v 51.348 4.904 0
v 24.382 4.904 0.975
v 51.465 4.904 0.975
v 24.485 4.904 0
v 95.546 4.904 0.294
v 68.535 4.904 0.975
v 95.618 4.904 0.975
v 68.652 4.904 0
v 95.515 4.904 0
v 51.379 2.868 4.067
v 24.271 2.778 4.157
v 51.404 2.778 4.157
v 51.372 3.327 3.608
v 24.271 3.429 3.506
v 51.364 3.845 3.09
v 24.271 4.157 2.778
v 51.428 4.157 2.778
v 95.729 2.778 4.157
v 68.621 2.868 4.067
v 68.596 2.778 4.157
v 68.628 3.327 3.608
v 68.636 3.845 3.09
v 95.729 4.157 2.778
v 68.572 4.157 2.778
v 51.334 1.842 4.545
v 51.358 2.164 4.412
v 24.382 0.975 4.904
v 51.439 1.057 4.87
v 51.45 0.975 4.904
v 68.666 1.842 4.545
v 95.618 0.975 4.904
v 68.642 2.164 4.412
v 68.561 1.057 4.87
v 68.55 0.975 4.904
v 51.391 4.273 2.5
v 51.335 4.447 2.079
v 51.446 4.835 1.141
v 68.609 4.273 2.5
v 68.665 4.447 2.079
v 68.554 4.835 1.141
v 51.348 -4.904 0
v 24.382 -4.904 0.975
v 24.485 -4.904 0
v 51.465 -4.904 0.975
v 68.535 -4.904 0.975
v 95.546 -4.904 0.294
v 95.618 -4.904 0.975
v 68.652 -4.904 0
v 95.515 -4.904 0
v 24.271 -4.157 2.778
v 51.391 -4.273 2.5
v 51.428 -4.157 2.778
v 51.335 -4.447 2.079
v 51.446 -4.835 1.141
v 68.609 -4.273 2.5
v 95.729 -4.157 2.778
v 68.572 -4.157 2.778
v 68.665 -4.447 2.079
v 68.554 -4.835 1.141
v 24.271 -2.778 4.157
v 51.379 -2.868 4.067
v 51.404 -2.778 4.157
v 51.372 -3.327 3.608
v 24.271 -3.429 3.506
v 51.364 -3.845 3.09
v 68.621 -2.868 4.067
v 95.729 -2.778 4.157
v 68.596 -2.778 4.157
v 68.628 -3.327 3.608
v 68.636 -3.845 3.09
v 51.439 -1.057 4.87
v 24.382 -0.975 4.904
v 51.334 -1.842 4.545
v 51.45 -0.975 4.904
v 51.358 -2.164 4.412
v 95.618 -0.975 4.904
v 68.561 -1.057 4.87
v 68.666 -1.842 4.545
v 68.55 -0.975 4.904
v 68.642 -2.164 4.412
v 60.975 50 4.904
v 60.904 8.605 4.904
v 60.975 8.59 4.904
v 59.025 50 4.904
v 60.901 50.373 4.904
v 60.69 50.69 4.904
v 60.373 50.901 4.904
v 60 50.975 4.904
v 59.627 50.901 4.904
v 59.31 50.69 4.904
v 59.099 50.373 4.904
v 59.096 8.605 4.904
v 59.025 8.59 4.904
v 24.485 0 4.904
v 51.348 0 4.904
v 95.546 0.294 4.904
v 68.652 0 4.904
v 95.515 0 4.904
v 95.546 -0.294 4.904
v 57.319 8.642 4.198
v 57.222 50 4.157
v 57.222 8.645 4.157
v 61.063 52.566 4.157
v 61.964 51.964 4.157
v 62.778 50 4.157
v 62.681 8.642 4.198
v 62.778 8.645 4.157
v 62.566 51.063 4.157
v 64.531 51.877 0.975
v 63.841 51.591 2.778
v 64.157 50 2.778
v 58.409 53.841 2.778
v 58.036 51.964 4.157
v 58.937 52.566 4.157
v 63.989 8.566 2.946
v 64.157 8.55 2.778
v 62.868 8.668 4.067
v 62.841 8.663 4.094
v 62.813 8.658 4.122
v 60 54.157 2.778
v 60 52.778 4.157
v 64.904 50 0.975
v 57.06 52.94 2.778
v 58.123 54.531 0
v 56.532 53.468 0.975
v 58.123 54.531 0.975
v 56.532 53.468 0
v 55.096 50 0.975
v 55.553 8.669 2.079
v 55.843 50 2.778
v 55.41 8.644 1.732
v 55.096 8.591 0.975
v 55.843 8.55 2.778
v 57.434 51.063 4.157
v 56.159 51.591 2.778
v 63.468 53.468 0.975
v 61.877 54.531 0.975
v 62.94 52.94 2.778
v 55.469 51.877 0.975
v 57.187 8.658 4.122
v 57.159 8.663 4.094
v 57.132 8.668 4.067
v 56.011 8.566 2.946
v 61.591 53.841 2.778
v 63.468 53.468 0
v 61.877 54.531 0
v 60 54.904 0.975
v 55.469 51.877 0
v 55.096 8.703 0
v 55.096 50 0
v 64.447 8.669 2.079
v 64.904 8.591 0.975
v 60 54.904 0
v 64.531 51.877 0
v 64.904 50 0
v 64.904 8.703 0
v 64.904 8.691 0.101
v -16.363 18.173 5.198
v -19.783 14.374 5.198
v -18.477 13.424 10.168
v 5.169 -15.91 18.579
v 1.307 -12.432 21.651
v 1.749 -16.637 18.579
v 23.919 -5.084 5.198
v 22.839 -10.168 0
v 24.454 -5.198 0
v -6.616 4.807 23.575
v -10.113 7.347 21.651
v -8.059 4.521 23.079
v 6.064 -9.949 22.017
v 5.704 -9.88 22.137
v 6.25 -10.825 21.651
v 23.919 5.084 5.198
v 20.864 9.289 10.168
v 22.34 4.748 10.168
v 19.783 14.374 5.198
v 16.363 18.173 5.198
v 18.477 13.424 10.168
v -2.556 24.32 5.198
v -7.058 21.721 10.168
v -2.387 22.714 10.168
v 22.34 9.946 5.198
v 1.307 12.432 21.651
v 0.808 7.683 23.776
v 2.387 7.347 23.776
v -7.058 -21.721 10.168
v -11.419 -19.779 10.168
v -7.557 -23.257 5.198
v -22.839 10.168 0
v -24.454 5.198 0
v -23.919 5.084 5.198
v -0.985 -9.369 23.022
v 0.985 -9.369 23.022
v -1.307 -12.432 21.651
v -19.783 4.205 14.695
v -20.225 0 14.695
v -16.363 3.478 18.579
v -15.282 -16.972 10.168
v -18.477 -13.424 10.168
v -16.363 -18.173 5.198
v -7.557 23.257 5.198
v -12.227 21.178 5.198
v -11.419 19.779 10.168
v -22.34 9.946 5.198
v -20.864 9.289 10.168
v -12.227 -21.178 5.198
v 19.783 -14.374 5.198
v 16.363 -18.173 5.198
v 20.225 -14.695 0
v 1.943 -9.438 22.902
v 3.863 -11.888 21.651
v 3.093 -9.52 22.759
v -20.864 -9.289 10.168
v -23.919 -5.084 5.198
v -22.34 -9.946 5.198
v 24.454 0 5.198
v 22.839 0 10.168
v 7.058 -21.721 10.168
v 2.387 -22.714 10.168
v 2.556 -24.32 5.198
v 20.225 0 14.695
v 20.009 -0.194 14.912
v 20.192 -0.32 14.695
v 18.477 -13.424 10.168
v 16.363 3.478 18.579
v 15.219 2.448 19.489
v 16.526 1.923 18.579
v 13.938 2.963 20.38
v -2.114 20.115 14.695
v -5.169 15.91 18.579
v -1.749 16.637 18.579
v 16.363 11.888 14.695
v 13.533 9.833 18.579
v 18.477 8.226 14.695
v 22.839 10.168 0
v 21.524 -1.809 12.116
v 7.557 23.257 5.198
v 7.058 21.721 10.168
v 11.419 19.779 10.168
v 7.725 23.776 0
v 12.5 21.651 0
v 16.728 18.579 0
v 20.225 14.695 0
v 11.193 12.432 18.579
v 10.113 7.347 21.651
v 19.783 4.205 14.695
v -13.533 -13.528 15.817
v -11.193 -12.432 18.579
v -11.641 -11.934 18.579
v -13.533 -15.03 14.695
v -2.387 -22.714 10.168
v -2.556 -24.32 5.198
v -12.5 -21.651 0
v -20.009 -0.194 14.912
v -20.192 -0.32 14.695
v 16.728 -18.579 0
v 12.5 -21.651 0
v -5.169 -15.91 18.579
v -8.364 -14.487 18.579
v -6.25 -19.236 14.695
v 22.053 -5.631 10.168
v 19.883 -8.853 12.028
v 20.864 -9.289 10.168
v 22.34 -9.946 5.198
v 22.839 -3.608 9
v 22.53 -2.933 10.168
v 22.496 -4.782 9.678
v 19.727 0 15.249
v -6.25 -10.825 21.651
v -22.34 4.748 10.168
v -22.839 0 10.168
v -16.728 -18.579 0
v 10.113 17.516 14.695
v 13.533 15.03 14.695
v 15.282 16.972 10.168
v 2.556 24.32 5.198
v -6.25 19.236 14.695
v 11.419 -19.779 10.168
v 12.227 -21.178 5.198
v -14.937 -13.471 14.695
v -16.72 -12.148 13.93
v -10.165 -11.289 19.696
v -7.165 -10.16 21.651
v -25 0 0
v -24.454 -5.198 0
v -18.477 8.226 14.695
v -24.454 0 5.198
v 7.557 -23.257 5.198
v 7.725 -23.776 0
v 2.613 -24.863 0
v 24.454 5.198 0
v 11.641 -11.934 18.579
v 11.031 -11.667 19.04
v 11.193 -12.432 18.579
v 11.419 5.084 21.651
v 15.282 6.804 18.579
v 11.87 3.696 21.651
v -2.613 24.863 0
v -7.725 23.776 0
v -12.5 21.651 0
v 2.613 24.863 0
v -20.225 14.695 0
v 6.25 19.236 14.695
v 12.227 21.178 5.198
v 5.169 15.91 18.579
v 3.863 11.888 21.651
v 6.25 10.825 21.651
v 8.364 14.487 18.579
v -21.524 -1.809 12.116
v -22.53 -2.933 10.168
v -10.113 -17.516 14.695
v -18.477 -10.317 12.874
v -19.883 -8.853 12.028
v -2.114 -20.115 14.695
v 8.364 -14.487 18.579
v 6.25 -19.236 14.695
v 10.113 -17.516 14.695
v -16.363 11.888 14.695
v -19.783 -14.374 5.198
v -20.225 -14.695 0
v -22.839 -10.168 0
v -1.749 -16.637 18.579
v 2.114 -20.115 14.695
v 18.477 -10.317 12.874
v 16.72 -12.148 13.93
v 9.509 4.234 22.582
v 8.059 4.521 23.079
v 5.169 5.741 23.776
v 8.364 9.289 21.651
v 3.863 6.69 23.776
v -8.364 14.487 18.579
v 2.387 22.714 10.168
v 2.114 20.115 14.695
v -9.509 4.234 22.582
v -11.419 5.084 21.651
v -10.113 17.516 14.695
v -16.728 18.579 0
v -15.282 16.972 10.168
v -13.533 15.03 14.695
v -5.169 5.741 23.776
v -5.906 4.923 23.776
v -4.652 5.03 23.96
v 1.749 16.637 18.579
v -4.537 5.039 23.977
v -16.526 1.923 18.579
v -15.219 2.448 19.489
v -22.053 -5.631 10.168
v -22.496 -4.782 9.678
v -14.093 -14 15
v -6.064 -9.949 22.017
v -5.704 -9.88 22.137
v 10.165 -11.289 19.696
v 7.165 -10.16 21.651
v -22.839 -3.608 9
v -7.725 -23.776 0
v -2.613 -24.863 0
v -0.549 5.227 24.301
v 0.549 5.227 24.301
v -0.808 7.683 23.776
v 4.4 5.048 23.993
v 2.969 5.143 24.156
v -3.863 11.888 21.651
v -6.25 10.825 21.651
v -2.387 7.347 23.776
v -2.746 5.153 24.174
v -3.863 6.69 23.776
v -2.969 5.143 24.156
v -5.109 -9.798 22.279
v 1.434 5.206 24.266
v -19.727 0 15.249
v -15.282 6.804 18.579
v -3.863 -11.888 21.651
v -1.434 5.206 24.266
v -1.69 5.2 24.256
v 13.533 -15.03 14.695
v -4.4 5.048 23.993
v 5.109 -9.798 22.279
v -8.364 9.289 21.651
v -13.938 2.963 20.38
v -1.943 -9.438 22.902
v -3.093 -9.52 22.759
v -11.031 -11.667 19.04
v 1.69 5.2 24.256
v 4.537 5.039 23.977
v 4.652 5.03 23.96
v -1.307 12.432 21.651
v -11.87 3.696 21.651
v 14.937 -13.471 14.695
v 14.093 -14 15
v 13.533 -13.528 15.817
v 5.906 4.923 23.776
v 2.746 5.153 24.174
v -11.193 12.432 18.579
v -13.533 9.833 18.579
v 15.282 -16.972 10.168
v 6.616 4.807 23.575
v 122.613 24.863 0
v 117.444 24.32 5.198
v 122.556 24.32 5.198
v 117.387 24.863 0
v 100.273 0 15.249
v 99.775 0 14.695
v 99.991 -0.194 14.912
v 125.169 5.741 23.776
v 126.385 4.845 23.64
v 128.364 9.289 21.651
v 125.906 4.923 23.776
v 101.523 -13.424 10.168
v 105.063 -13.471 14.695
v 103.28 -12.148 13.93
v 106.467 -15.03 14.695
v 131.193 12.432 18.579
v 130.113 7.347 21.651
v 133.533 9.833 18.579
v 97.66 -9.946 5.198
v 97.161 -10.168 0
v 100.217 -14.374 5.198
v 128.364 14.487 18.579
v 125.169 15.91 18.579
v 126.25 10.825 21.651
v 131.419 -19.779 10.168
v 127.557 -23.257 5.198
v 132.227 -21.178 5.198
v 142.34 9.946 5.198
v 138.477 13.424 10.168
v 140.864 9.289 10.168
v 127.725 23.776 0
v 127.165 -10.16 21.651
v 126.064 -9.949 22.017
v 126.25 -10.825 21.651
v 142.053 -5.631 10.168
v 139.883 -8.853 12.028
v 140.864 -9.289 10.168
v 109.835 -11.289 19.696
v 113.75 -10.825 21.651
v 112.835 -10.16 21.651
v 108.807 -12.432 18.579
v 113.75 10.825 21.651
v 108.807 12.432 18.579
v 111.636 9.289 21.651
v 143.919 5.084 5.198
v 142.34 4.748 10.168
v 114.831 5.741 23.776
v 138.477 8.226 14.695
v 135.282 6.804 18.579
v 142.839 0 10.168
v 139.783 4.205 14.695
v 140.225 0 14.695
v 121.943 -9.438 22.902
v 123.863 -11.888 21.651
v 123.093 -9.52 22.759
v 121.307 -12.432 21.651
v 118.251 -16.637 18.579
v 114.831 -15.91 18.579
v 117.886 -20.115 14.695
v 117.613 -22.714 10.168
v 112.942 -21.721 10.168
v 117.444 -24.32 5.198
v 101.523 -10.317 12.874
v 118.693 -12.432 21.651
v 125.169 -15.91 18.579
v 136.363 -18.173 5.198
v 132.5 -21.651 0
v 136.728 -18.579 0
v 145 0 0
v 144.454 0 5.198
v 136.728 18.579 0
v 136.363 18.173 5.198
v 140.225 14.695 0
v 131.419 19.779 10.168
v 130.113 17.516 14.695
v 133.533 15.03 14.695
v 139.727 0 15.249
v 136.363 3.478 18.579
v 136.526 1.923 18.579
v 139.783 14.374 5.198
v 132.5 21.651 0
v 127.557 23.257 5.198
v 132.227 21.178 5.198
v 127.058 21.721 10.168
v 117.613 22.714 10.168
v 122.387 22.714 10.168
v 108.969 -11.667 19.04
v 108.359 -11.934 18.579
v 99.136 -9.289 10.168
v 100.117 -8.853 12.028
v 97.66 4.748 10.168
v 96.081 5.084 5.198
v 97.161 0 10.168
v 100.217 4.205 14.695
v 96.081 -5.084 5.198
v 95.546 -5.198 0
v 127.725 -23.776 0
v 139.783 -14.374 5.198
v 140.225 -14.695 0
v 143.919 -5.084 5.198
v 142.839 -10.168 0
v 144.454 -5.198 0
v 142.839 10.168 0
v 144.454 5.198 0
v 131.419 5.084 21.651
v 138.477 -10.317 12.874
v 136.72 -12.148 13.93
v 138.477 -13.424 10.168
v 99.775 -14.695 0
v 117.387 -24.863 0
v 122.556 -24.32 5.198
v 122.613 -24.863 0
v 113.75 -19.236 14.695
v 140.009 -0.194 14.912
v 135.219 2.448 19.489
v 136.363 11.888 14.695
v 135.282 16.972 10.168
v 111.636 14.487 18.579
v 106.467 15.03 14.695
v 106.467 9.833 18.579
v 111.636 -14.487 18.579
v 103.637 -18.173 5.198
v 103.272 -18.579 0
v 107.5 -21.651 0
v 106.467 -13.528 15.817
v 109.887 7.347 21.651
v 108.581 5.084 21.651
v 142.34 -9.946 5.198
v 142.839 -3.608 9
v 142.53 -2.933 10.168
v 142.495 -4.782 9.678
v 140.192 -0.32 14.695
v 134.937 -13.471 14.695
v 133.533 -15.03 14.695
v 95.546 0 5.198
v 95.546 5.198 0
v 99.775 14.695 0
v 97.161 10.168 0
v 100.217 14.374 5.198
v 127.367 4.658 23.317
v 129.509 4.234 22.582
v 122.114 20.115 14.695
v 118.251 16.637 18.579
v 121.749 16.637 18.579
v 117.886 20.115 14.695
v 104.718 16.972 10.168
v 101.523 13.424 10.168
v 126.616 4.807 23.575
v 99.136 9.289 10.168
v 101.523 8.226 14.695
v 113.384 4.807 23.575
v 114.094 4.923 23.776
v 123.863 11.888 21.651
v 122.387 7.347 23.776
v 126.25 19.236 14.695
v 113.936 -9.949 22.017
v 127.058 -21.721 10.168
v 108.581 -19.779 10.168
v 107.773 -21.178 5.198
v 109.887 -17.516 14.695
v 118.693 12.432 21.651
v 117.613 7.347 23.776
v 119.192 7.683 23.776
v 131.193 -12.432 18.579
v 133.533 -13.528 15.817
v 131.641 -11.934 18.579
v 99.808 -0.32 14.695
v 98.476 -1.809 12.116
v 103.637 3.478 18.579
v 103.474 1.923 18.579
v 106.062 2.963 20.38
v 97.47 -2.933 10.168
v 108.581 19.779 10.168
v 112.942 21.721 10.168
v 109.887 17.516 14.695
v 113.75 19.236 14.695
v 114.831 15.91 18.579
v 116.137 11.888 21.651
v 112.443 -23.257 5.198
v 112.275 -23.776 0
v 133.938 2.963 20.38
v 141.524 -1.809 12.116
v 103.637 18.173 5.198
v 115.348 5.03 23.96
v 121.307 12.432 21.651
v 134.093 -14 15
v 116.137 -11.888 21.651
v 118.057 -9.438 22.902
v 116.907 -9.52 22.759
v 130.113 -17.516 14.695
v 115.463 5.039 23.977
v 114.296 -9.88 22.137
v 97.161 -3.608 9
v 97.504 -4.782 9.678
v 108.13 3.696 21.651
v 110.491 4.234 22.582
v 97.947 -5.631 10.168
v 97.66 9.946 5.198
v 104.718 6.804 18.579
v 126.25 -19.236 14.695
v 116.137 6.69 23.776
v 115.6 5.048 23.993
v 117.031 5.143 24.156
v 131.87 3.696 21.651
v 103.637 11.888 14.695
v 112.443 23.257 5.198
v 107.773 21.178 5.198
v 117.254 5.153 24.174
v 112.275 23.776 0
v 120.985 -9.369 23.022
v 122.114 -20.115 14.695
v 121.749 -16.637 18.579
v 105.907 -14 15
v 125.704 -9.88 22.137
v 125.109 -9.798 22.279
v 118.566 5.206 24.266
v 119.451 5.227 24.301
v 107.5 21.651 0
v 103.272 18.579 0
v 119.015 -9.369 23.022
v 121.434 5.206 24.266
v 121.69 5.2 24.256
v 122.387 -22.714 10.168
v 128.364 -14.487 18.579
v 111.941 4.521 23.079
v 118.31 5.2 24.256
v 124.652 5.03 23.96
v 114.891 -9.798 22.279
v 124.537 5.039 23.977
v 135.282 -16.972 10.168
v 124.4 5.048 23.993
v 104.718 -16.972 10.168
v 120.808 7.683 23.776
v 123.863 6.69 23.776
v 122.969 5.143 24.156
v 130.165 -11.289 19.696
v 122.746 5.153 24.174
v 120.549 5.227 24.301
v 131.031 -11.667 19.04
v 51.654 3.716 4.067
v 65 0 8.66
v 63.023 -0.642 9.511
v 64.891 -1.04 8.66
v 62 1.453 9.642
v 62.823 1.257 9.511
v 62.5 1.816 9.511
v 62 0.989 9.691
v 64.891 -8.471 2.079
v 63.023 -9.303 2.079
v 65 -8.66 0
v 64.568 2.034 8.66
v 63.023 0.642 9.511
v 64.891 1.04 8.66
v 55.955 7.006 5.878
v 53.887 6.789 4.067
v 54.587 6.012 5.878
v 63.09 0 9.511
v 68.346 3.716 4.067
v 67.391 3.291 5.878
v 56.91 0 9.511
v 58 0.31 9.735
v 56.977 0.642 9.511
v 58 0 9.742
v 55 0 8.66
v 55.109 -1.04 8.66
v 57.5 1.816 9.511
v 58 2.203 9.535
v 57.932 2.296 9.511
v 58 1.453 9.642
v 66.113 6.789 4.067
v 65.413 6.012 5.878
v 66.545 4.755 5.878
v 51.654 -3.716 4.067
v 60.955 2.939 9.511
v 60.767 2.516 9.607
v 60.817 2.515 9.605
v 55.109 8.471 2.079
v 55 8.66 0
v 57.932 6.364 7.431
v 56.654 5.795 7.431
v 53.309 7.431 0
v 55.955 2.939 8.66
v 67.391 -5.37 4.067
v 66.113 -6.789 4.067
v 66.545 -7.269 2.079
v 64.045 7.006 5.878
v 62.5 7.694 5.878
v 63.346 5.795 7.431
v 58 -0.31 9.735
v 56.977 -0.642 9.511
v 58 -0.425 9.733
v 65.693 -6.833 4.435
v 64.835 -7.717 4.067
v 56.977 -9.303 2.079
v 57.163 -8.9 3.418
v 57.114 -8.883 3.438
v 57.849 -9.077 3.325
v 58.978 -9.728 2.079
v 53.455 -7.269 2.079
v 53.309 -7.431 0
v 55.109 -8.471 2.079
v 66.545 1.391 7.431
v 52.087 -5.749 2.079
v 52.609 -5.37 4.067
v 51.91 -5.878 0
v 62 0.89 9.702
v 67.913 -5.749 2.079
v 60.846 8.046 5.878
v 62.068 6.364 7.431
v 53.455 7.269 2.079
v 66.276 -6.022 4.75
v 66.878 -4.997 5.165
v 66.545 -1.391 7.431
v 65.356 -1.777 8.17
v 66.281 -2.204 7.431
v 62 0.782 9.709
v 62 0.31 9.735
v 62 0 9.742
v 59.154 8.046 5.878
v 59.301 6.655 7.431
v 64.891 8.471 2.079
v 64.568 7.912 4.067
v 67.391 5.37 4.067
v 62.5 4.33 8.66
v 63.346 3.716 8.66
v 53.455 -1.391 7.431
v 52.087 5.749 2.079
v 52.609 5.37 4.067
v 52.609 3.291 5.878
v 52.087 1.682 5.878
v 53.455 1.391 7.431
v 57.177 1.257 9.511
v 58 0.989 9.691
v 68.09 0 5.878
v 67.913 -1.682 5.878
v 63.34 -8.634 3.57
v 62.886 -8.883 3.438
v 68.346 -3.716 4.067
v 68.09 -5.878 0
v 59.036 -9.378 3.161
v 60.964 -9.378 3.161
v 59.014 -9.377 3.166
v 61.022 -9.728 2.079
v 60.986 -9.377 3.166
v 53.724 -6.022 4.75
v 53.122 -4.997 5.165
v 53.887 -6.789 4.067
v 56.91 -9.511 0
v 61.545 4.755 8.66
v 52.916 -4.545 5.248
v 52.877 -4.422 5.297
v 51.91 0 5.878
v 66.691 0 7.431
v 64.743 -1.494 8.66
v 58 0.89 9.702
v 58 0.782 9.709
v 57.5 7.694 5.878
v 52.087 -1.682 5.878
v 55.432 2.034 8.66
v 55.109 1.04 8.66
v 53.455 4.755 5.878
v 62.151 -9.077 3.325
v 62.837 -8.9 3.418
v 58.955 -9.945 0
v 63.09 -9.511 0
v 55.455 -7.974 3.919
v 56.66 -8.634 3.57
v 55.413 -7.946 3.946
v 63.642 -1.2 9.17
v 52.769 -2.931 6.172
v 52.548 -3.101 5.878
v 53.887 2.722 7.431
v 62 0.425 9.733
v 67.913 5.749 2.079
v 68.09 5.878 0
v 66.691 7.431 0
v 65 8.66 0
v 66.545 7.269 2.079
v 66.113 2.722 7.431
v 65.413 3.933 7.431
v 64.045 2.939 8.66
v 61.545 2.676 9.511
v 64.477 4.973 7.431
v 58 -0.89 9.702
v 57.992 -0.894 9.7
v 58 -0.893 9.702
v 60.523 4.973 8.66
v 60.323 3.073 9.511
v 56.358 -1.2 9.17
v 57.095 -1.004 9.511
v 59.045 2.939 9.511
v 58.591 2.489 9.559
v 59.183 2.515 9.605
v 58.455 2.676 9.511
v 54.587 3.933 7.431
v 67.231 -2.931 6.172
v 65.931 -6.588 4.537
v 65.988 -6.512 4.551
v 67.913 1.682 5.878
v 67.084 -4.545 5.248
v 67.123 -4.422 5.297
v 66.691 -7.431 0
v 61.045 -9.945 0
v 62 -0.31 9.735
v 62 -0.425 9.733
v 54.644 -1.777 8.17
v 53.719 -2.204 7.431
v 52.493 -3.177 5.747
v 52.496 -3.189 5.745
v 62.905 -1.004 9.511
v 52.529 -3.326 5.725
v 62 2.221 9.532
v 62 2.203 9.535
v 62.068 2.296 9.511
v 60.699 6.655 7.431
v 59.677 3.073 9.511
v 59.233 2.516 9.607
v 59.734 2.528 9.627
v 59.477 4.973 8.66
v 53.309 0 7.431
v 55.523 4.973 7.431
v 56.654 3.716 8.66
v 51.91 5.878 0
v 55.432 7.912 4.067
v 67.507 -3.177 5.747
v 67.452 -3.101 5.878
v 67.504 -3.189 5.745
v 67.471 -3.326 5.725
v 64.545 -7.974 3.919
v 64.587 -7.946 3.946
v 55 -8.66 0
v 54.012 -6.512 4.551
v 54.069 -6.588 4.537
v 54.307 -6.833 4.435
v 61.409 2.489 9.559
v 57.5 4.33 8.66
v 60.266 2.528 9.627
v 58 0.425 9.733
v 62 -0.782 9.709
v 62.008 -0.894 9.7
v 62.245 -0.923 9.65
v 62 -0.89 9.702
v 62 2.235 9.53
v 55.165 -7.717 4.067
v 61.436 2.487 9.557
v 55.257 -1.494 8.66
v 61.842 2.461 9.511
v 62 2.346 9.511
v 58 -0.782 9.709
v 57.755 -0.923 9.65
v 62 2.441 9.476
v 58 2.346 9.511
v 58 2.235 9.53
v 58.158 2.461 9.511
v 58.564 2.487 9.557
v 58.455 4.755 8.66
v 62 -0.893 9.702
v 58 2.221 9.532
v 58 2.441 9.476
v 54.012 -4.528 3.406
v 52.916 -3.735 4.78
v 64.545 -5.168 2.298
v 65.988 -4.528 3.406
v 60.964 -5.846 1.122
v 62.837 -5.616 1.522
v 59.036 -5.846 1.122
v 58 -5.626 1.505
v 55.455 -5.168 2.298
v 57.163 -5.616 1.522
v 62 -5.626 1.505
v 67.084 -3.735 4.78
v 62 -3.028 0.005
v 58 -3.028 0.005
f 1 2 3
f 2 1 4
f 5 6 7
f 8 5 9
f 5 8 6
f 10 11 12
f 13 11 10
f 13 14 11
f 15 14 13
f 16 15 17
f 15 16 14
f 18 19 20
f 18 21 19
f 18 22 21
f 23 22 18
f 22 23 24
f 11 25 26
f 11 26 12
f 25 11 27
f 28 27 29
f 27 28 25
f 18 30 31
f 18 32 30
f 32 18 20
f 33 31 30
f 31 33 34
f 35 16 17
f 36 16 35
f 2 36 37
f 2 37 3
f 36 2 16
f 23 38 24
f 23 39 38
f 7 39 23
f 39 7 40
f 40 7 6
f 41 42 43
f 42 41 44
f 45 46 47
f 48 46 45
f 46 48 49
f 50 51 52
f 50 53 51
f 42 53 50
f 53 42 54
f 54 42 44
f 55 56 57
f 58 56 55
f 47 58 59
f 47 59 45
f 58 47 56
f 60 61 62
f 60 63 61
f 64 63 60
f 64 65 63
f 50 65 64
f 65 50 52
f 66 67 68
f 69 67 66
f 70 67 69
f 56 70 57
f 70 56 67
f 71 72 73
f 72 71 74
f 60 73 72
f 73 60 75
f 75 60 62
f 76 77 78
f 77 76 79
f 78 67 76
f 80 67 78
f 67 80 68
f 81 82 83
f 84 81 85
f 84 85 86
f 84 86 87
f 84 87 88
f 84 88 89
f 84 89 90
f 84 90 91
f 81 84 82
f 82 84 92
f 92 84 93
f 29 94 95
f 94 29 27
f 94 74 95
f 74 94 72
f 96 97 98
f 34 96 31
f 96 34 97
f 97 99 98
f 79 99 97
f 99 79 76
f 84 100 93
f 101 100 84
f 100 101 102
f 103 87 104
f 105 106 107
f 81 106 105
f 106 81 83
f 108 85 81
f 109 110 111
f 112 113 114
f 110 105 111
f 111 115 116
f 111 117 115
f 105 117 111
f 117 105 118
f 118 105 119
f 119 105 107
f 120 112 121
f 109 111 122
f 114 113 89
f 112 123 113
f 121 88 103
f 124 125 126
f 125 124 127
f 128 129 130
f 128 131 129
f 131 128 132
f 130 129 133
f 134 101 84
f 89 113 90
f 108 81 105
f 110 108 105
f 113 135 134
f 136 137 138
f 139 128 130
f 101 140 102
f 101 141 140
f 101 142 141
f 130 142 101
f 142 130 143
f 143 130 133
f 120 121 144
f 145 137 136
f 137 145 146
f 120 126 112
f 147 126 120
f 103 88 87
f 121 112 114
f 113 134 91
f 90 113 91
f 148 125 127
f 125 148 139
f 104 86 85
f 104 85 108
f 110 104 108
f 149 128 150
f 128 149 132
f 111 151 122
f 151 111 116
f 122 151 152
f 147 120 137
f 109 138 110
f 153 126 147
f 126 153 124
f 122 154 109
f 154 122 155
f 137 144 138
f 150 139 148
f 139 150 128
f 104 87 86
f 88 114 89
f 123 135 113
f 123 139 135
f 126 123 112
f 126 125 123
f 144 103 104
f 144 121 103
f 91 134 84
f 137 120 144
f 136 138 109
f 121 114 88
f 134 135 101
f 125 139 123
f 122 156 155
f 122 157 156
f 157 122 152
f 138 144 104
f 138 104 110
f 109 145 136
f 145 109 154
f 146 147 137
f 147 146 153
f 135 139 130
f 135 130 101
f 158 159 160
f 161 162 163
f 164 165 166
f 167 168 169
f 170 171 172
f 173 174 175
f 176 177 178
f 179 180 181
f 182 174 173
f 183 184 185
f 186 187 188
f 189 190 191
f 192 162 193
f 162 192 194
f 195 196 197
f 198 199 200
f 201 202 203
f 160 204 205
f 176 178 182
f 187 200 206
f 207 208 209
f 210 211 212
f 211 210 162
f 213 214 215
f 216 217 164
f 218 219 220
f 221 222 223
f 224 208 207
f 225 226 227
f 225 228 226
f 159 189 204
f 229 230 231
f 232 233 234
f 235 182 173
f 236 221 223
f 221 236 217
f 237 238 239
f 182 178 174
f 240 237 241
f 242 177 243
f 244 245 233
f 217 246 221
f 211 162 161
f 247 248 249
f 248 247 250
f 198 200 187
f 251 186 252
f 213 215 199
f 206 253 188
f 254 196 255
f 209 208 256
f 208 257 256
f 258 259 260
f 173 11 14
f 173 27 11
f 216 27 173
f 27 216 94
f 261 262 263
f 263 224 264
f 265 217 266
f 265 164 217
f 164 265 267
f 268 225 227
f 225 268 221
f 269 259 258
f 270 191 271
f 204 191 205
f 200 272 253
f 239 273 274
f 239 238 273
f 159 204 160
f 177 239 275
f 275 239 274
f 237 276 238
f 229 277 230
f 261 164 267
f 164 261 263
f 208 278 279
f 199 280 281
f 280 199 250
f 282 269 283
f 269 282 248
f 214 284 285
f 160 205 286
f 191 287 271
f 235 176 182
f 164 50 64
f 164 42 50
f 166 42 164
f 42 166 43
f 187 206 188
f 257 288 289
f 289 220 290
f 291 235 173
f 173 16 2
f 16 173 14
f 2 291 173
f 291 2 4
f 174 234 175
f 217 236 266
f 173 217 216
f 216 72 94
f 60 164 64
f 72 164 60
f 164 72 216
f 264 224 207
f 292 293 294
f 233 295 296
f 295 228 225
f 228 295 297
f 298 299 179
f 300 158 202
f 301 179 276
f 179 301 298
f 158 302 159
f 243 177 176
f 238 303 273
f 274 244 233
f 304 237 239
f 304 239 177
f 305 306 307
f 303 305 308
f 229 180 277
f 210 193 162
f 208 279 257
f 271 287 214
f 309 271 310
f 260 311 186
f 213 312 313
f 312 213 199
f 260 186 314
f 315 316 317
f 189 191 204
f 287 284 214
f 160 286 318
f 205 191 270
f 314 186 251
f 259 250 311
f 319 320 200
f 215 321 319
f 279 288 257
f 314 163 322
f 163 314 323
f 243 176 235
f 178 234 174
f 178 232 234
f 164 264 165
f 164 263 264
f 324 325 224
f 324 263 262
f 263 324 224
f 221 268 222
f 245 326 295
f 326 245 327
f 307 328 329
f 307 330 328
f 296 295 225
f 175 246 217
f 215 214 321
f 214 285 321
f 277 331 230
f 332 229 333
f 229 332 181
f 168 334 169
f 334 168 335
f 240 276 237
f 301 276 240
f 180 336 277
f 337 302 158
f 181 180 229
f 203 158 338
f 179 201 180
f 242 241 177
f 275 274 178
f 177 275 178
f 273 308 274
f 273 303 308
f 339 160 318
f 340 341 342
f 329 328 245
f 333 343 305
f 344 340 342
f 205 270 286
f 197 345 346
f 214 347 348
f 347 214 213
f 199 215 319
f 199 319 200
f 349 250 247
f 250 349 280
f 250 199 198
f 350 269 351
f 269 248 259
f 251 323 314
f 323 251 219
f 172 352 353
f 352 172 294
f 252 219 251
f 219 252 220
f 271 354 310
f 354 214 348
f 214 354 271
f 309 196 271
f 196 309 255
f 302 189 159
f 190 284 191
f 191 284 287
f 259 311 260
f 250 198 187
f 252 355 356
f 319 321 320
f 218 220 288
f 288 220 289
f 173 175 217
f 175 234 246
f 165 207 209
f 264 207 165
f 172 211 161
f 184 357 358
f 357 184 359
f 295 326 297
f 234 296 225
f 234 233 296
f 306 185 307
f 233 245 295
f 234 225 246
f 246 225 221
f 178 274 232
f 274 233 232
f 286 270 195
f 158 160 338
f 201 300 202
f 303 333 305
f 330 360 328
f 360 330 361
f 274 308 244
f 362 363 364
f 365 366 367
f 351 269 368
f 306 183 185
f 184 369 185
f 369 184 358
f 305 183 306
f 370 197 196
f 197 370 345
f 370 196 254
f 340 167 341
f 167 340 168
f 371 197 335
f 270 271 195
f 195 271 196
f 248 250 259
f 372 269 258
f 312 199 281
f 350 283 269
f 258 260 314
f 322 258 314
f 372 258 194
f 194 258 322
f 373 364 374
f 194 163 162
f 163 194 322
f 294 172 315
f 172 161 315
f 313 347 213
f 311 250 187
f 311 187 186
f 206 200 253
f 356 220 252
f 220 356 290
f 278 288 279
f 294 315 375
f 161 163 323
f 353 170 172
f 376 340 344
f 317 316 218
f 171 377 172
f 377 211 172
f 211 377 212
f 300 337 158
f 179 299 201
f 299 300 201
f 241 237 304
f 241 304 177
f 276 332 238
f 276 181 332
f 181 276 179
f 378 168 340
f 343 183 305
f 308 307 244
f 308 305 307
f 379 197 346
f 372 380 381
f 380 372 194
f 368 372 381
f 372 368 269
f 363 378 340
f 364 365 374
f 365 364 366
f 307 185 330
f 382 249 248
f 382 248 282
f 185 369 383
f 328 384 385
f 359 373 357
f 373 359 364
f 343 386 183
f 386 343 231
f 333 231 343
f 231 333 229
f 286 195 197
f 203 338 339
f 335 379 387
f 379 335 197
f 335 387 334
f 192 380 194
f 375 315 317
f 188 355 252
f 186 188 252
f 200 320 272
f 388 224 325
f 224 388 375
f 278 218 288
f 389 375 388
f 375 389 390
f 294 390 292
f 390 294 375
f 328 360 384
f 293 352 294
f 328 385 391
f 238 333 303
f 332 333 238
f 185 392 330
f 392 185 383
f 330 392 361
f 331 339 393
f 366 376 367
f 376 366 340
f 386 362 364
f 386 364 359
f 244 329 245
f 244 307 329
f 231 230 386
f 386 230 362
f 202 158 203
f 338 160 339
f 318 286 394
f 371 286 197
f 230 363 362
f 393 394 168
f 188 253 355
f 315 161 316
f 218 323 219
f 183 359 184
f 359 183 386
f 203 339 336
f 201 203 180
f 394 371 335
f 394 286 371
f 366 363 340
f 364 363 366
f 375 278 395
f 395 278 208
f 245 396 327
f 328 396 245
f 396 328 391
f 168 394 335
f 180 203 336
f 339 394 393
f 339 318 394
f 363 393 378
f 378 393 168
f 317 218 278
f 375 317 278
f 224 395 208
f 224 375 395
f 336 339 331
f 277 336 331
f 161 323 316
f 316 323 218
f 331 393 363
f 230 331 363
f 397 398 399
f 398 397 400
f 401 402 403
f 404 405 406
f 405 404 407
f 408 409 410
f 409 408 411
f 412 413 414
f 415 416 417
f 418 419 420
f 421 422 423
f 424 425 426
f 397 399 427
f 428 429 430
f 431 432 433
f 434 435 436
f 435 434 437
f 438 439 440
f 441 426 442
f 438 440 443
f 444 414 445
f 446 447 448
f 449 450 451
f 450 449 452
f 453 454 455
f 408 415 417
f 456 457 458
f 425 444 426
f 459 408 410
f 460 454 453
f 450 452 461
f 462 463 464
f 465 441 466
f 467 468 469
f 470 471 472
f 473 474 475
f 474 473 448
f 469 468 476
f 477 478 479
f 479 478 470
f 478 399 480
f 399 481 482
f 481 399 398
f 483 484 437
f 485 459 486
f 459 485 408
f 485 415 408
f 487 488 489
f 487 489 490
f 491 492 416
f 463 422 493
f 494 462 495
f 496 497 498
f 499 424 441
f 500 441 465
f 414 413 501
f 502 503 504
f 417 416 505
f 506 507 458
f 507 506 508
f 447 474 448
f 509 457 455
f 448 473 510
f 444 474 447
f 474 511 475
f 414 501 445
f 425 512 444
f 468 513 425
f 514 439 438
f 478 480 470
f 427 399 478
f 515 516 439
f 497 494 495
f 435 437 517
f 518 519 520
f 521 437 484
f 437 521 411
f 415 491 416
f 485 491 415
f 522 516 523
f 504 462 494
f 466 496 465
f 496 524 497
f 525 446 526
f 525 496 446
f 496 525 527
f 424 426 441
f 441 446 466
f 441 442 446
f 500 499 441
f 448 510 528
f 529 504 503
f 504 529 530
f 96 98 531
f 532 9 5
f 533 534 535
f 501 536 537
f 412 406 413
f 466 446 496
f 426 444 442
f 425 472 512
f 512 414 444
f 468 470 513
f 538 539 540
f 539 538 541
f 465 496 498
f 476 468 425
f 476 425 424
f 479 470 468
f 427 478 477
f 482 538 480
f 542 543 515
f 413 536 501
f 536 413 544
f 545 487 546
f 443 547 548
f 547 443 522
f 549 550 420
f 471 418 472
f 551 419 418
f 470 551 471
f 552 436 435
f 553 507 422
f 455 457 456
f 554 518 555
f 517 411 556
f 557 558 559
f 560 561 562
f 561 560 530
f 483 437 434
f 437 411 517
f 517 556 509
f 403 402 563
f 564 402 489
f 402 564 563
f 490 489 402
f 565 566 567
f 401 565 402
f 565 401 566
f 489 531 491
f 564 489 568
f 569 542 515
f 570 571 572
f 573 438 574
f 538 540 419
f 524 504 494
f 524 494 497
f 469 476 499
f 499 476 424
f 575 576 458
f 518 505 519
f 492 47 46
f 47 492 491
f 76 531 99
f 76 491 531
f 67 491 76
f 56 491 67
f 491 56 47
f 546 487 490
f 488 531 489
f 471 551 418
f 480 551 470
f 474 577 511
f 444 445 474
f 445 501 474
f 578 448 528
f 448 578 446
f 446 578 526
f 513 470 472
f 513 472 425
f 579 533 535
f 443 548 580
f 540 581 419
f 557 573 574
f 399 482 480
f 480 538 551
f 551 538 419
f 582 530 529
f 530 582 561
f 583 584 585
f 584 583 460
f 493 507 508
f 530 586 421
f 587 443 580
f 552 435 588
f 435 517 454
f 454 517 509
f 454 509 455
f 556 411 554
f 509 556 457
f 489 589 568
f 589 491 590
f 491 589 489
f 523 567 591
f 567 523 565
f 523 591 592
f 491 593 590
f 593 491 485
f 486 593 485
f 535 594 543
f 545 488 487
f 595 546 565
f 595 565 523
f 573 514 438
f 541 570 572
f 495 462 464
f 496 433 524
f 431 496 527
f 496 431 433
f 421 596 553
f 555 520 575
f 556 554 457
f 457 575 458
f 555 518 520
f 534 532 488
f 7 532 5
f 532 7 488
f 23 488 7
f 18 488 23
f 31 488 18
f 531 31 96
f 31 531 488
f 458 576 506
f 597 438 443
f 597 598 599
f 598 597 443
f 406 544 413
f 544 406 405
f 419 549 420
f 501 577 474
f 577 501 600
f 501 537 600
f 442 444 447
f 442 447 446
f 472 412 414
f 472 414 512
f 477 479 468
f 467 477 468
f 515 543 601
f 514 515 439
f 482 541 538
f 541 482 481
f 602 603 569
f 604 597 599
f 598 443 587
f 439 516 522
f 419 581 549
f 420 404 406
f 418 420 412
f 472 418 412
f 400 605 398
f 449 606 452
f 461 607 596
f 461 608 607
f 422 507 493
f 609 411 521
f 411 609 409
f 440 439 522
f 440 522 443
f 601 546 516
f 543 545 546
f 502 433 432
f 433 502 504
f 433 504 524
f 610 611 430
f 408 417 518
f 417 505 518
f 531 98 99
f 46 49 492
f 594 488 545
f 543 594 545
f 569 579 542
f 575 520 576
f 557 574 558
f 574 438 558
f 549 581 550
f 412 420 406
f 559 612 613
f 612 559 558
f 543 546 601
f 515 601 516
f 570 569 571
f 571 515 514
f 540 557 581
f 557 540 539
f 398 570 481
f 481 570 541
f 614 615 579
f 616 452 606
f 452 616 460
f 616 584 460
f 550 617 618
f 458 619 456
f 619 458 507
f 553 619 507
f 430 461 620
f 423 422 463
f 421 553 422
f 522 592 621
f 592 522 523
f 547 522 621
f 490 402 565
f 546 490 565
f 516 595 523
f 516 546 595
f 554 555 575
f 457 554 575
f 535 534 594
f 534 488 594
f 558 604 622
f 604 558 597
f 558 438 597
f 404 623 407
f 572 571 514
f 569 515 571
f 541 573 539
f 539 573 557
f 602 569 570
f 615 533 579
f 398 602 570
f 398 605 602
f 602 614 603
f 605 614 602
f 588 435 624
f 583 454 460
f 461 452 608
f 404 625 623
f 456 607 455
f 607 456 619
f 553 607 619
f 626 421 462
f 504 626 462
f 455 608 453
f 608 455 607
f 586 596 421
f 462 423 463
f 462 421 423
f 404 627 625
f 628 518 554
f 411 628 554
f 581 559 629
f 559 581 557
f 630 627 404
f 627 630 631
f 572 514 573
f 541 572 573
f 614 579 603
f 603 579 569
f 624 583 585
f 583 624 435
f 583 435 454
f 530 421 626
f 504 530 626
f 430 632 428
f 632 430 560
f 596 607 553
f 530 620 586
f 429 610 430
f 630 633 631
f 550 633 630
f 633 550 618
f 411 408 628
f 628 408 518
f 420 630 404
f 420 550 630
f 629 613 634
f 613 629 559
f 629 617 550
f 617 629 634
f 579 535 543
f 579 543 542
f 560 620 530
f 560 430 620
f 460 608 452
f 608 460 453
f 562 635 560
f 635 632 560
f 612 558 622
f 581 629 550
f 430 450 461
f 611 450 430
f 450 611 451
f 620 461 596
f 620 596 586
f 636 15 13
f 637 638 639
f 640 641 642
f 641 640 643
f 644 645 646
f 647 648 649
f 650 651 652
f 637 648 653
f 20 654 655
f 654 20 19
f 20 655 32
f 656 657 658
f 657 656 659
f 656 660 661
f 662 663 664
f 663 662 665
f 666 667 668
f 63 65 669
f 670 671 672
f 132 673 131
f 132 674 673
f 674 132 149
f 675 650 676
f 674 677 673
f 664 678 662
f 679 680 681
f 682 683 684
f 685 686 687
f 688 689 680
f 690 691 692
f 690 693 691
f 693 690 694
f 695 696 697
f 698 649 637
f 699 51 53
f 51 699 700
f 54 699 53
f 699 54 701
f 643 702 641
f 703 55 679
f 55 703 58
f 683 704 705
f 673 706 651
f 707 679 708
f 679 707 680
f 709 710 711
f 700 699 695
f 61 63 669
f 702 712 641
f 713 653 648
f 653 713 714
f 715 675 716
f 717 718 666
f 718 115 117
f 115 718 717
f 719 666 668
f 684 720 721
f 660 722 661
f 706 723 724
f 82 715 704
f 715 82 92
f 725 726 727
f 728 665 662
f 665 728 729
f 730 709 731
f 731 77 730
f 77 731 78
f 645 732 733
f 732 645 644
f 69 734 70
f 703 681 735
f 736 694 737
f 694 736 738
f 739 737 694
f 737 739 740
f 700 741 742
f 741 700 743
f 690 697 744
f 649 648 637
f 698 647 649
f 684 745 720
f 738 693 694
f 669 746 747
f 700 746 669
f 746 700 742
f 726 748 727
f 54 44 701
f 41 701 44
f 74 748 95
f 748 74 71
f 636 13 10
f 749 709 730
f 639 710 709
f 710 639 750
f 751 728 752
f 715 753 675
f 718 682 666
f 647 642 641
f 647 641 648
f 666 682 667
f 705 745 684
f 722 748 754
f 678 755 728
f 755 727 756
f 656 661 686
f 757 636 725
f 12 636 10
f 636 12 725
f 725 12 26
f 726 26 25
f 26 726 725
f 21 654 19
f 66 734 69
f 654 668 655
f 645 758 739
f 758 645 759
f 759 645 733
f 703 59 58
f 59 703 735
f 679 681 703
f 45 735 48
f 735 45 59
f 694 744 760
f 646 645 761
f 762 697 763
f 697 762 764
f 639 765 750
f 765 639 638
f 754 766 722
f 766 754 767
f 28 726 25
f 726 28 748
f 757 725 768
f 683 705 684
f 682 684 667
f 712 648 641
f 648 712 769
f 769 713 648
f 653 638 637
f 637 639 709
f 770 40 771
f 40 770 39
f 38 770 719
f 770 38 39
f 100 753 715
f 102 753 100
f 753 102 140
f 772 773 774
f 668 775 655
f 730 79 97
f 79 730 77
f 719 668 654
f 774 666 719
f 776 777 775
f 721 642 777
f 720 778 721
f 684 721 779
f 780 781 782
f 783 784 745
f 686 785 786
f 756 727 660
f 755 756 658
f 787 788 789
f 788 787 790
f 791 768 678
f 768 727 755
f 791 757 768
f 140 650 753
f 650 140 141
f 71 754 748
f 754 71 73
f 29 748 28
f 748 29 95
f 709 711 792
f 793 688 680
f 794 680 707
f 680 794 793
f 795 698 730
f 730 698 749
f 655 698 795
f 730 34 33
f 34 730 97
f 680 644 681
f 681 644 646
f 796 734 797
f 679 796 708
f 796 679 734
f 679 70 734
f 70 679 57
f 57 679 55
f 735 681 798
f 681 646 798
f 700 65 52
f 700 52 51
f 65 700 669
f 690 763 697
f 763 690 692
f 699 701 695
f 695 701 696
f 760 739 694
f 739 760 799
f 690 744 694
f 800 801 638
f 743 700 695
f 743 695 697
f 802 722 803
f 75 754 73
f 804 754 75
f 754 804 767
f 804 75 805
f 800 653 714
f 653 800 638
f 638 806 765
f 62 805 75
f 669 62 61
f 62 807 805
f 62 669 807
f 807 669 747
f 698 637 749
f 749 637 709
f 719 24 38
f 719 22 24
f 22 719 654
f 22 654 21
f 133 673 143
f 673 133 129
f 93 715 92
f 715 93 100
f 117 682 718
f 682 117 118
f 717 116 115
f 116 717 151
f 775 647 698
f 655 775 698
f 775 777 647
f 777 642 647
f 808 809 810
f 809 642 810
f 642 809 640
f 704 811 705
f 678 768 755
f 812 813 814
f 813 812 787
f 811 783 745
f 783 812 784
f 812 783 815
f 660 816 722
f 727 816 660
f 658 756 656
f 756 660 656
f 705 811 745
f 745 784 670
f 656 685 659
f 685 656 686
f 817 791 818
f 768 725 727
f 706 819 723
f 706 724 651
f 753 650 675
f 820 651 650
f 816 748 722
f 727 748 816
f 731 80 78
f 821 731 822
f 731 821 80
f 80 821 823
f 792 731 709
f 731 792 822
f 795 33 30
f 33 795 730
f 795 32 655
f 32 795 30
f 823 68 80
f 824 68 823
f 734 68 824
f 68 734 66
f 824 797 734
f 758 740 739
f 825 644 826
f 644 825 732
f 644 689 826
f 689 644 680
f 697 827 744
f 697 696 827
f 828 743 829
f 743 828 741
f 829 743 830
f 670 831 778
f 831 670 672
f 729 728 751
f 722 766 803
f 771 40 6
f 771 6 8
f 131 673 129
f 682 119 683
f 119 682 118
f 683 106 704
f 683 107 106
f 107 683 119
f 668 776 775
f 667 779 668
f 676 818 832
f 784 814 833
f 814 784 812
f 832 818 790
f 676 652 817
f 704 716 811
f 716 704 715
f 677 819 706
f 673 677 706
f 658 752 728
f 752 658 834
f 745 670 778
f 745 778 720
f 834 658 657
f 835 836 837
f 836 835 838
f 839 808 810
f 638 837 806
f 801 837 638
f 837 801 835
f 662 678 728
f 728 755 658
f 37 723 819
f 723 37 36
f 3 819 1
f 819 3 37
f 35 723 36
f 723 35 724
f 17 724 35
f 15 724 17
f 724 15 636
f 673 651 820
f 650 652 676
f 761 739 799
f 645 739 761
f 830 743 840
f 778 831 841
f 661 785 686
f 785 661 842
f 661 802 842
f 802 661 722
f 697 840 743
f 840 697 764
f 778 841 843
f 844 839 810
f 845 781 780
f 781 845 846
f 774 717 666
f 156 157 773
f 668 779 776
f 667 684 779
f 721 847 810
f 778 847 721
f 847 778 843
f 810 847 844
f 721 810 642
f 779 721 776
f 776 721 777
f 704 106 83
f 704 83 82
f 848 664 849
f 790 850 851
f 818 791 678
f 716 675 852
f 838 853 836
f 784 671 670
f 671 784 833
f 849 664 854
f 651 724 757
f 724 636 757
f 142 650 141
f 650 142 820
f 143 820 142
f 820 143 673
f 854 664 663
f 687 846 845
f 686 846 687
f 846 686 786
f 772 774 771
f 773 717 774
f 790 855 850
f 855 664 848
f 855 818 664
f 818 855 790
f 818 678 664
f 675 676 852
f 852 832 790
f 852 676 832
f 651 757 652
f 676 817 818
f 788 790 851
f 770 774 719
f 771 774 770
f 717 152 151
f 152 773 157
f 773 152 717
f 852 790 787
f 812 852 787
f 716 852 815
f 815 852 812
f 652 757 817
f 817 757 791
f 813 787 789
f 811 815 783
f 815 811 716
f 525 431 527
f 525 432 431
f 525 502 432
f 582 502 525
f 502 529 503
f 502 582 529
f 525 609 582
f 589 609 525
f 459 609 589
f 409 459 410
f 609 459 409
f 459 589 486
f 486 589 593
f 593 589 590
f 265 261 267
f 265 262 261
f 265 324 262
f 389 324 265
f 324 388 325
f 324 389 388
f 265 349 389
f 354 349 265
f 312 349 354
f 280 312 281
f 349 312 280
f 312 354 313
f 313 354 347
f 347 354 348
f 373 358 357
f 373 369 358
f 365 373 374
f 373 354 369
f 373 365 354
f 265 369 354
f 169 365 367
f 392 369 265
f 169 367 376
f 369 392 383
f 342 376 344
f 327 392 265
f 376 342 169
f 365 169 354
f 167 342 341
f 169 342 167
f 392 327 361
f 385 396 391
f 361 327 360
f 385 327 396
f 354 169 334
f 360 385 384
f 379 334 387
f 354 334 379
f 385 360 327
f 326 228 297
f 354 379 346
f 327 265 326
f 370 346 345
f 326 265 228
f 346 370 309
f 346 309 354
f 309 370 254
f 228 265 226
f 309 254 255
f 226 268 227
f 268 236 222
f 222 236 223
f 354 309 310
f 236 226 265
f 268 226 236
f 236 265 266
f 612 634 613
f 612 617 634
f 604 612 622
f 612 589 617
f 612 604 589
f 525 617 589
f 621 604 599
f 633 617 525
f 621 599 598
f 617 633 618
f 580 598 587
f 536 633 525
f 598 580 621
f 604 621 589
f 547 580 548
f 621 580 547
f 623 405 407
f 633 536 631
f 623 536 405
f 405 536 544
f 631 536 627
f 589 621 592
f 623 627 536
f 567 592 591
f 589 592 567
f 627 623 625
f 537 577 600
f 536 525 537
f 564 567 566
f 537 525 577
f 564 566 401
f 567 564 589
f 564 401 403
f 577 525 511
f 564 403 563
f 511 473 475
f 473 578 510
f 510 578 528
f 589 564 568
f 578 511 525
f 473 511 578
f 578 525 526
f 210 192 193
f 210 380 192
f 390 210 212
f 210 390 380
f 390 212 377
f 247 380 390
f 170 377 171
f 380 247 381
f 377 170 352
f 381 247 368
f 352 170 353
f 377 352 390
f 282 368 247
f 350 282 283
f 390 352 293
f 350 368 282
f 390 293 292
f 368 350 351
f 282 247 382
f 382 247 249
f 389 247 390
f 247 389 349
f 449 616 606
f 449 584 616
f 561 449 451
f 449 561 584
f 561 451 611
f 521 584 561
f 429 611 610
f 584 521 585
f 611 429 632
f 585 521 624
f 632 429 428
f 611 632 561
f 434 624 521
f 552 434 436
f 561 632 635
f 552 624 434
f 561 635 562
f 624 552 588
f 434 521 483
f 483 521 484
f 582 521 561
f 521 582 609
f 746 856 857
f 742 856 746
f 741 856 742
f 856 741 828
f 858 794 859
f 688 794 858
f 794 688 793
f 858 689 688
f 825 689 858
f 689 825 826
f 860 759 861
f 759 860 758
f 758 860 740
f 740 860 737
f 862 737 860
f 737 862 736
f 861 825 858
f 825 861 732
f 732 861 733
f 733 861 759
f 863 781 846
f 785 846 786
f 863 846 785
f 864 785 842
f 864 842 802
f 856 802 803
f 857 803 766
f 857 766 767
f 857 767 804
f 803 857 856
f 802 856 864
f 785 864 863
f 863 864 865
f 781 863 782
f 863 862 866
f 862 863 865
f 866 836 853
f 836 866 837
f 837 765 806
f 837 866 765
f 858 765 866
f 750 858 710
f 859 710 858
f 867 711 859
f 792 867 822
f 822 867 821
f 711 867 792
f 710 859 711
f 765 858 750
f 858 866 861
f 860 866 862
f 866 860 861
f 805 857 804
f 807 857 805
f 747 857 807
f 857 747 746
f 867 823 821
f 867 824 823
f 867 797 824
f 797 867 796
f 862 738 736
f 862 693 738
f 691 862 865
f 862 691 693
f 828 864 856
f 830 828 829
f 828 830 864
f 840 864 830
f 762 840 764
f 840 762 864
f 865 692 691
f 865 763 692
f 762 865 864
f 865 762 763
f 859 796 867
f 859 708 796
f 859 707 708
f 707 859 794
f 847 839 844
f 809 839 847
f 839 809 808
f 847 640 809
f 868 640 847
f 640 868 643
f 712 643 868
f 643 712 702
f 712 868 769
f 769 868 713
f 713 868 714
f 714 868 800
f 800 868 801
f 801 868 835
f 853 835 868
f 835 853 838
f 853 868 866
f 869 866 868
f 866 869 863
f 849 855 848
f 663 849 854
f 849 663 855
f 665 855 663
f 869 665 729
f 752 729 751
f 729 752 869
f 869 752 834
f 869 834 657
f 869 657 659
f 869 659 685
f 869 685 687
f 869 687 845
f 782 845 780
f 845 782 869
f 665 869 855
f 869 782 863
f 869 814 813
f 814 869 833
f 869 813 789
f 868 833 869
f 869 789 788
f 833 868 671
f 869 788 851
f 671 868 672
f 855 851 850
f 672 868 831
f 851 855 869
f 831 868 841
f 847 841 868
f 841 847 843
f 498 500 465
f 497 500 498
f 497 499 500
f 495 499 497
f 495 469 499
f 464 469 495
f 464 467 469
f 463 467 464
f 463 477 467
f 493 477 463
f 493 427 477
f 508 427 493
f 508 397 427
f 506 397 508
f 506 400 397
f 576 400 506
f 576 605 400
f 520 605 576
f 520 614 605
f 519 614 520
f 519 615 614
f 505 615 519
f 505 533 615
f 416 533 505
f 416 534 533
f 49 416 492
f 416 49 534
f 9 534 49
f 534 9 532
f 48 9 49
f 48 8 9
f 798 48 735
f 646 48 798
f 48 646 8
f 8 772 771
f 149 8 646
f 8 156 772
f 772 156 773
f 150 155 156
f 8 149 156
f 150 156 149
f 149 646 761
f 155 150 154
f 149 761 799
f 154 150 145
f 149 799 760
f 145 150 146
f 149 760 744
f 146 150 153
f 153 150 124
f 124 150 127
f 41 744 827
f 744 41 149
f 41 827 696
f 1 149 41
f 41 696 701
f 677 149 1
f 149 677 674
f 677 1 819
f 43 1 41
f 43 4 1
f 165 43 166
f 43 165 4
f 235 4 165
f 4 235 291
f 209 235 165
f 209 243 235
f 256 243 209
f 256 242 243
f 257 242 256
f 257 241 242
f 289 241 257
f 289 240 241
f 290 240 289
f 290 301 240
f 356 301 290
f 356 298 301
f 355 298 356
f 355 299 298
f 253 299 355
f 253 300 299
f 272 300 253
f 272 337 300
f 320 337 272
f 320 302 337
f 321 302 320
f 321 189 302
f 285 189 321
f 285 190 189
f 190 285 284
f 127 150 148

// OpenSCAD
//// LattePanda original values:
// screen_y_view = 87;
// screen_y_size = 97.5;
// screen_x_view = 156;
// screen_x_size = 165;
// x_offset = 2;
// y_offset = 7;
// border = 2.5;
//
// panda_holes_x = 81.5;
// panda_holes_y = 63.5;

//// Additionnal values for LattePanda original:
// back_border = 6;
// screen_height = 3;
// titan_holes = 0;
// titan_mount = false;
// board_mount = true;

screen_y_view = 107;
screen_y_size = 111;
screen_x_view = 175;
screen_x_size = 179;
x_offset = 2;
y_offset = 2;
border = 3;

panda_holes_x = 113;
panda_holes_y = 76;
titan_holes = 75.5;
titan_mount = true;
board_mount = false;

back_border = 6;
screen_height = 6;

// Screen_Front();
// Screen_Back();
Base();

module Base(){
	difference(){
		union(){
			hull(){
			sphere(r = 5);
			translate([120, 0, 0]) sphere(r = 5);
			}
			hull(){
			translate([60, 0, 0])	sphere(r = 5);
			translate([60, 50, 0]) sphere(r = 5);
			}
			sphere(r = 25);
			translate([120, 0, 0]) sphere(r = 25);
			translate([60, 0, 0]) sphere(r = 10);
		}
		translate([0, -(screen_height + 8), 15])	rotate([-30, 0, 0])	Cover_Cut();
		translate([-30 , -30, -25])	cube([200, 200, 25]); 
	}
}

module Cover_Cut(){
		translate([-30, 0, 0])	cube([175, (screen_height + 6), 20]);
		translate([60, (screen_height + 8), 0])	rotate([90, 0, 0])	cylinder(r = 8, h = (screen_height + 8));
		translate([58, (screen_height + 7), -7.5])	cube([4, 4, 30]);
}

module Panda_Mount(){
	cylinder(r = 3, h = 8);
	translate([panda_holes_x, 0, 0])	cylinder(r = 3, h = 8);
	translate([panda_holes_x, panda_holes_y, 0])	cylinder(r = 3, h = 8);
	translate([0, panda_holes_y, 0])	cylinder(r = 3, h = 8);
}

module Panda_Holes(){
	cylinder(r = 1.6, h = 9);
    translate([panda_holes_x, 0, 0])   cylinder(r = 1.6, h = 9);
	translate([panda_holes_x, panda_holes_y, 0])    cylinder(r = 1.6, h = 9);
    translate([0, panda_holes_y, 0])    cylinder(r = 1.6, h = 9);
}

module Titan_Mount() {
    cylinder(r = 4, h = 7);
    translate([titan_holes, 0, 0]) cylinder(r = 4, h = 7);
}

module Titan_Holes() {
    translate([0, 0, 4.8]) cylinder(r = 2.1, h = 8);
    translate([titan_holes, 0, 4.8]) cylinder(r = 2.1, h = 8);
    cylinder(r = 3.6, h = 4.2);
    translate([titan_holes, 0, 0]) cylinder(r = 3.6, h = 4.2);
}

module Screen_Back(){
    // Local variables
    panda_hole_initial_x = (((border * 2) + screen_x_size) / 2) - (panda_holes_x / 2);
    panda_hole_initial_y = (((border * 2) + screen_y_size) / 2) - (panda_holes_y / 2);
    
	difference(){
        // Frame
		union(){
			hull(){
				cylinder(r = 4, h = 5);
				translate([0, (border * 2) + screen_y_size, 0])	cylinder(r = 4, h = 5);
				translate([(border * 2) + screen_x_size, (border * 2) + screen_y_size, 0])	cylinder(r = 4, h = 5);
				translate([(border * 2) + screen_x_size, 0, 0])	cylinder(r = 4, h = 5);
			}
			translate([((border * 2) + screen_x_size) / 2, -3, 0])	cylinder(r = 5, h = 5);
			translate([((border * 2) + screen_x_size) / 2, (border * 2) + screen_y_size + 3, 0])	cylinder(r = 5, h = 5);
            // Board mount
            if (board_mount) {
                translate([panda_hole_initial_x, panda_hole_initial_y, 0])	Panda_Mount();
            }
            // Titan mount
            if (titan_mount) {
                translate([((border * 2) + screen_x_size) / 2 - titan_holes / 2, screen_y_size / 2 + back_border, 0]) Titan_Mount();
            }
		}
        
        // Hex nut holes
		translate([0, 0, 1.5])	cylinder(r = 6.5 / 2, h = 3.6, $fn = 6);
		translate([0, (border * 2) + screen_y_size, 1.5])	cylinder(r = 6.5 / 2, h = 3.6, $fn = 6);
		translate([(border * 2) + screen_x_size, (border * 2) + screen_y_size, 1.5])	cylinder(r = 6.5 / 2, h = 3.6, $fn = 6);
		translate([(border * 2) + screen_x_size, 0, 1.5])	cylinder(r = 6.5 / 2, h = 3.6, $fn = 6);

		translate([((border * 2) + screen_x_size) / 2, -3, 1.5])	cylinder(r = 6.5 / 2, h = 4, $fn = 6);
		translate([((border * 2) + screen_x_size) / 2, (border * 2) + screen_y_size + 3, 1.5])	cylinder(r = 6.5  / 2, h = 4, $fn = 6);

        // Screw holes
		translate([((border * 2) + screen_x_size) / 2, -3, 0])	cylinder(r = 1.6, h = 5, $fn = 6);
		translate([((border * 2) + screen_x_size) / 2, (border * 2) + screen_y_size + 3, 0])	cylinder(r = 1.6, h = 5, $fn = 6);
		cylinder(r = 1.6, h = 5);
		translate([0, (border * 2) + screen_y_size, 0])	cylinder(r = 1.6, h = 5);
		translate([(border * 2) + screen_x_size, (border * 2) + screen_y_size, 0])	cylinder(r = 1.6, h = 5);
		translate([(border * 2) + screen_x_size, 0, 0])	cylinder(r = 1.6, h = 5);

        // Screen cable hole // translate([52, 5, 0])	cube([25, 3, 5]); // 58 for Alpha
		translate([panda_hole_initial_x + back_border, back_border - 1, 0])	cube([panda_holes_x - (back_border * 2), 3, 6]);
	
        // Frame holes 
            // Origin left hole
		translate([back_border, back_border, 0])	cube([(panda_hole_initial_x - back_border * 2), screen_y_size - back_border, 6]);
            // Origin right hole
		translate([back_border + panda_hole_initial_x + panda_holes_x , back_border, 0])	cube([(panda_hole_initial_x - back_border * 2), screen_y_size - back_border, 6]);
            // Origin middle low hole
		translate([panda_hole_initial_x + back_border, back_border * 2, 0])	cube([panda_holes_x - (back_border * 2), (screen_y_size / 2) - (back_border * 2), 6]);
            // Origin middle high hole
		translate([panda_hole_initial_x + back_border, (screen_y_size / 2) + back_border * 2, 0])	cube([panda_holes_x - (back_border * 2), (screen_y_size / 2) - (back_border * 2), 6]);

        // Mount holes
        if (board_mount) {
            translate([(((border * 2) + screen_x_size) / 2) - (panda_holes_x / 2), (((border * 2) + screen_y_size) / 2) - (panda_holes_y / 2), 0])	Panda_Holes();
        }
        
        // Titan holes
        if (titan_mount) {
            translate([((border * 2) + screen_x_size) / 2 - titan_holes / 2, screen_y_size / 2 + back_border, 0]) Titan_Holes();
        }
	}
	
}


module Screen_Front(){	
	difference(){
        // Frame
		union(){
			hull(){
				cylinder(r = 4, h = screen_height + 1);
				translate([0, (border * 2) + screen_y_size, 0])	cylinder(r = 4, h = screen_height + 1);
				translate([(border * 2) + screen_x_size, (border * 2) + screen_y_size, 0])	cylinder(r = 4, h = screen_height + 1);
				translate([(border * 2) + screen_x_size, 0, 0])	cylinder(r = 4, h = screen_height + 1);
			}
            // Middle screw holes
			translate([((border * 2) + screen_x_size) / 2, -3, 0])	cylinder(r = 5, h = screen_height + 1);
			translate([((border * 2) + screen_x_size) / 2, (border * 2) + screen_y_size + 3, 0])	cylinder(r = 5, h = screen_height + 1);
		}
        
        // Original LattePanda
//        translate([border + x_offset + 1, border + y_offset - 4, 0])	cube([screen_x_view, screen_y_view, 5]);
//		translate([border + 1, border, .5])	cube([screen_x_size, screen_y_size, 5]);
        
        // Screen holder
		translate([border + x_offset + 1, border + y_offset, 0])	cube([screen_x_view, screen_y_view, screen_height + 2]);
		translate([border + 1, border, .6])	cube([screen_x_size, screen_y_size, screen_height + 2]);

        // Holes for mounting
		translate([((border * 2) + screen_x_size) / 2, -3, 0])	cylinder(r = 3.1, h = 3.6);
		translate([((border * 2) + screen_x_size) / 2, (border * 2) + screen_y_size + 3, 0])	cylinder(r = 3.1, h = 3.6);
		cylinder(r = 3.1, h = 3.6);
		translate([0, (border * 2) + screen_y_size, 0])	cylinder(r = 3.1, h = 3.6);
		translate([(border * 2) + screen_x_size, (border * 2) + screen_y_size, 0])	cylinder(r = 3.1, h = 3.6);
		translate([(border * 2) + screen_x_size, 0, 0])	cylinder(r = 3.1, h = 3.6);

        // Frame holes
		translate([0, 0, screen_height + 0.8])	cylinder(r = 1.6, h = screen_height);
		translate([0, (border * 2) + screen_y_size, screen_height + 0.8])	cylinder(r = 1.6, h = screen_height);
		translate([(border * 2) + screen_x_size, (border * 2) + screen_y_size, screen_height + 0.8])	cylinder(r = 1.6, h = screen_height);
		translate([(border * 2) + screen_x_size, 0, screen_height + 0.8])	cylinder(r = 1.6, h = screen_height);
		translate([((border * 2) + screen_x_size) / 2, -3, screen_height + 0.8])	cylinder(r = 1.6, h = screen_height);
		translate([((border * 2) + screen_x_size) / 2, (border * 2) + screen_y_size + 3, screen_height + 0.8])	cylinder(r = 1.6, h = screen_height);
	}
}
